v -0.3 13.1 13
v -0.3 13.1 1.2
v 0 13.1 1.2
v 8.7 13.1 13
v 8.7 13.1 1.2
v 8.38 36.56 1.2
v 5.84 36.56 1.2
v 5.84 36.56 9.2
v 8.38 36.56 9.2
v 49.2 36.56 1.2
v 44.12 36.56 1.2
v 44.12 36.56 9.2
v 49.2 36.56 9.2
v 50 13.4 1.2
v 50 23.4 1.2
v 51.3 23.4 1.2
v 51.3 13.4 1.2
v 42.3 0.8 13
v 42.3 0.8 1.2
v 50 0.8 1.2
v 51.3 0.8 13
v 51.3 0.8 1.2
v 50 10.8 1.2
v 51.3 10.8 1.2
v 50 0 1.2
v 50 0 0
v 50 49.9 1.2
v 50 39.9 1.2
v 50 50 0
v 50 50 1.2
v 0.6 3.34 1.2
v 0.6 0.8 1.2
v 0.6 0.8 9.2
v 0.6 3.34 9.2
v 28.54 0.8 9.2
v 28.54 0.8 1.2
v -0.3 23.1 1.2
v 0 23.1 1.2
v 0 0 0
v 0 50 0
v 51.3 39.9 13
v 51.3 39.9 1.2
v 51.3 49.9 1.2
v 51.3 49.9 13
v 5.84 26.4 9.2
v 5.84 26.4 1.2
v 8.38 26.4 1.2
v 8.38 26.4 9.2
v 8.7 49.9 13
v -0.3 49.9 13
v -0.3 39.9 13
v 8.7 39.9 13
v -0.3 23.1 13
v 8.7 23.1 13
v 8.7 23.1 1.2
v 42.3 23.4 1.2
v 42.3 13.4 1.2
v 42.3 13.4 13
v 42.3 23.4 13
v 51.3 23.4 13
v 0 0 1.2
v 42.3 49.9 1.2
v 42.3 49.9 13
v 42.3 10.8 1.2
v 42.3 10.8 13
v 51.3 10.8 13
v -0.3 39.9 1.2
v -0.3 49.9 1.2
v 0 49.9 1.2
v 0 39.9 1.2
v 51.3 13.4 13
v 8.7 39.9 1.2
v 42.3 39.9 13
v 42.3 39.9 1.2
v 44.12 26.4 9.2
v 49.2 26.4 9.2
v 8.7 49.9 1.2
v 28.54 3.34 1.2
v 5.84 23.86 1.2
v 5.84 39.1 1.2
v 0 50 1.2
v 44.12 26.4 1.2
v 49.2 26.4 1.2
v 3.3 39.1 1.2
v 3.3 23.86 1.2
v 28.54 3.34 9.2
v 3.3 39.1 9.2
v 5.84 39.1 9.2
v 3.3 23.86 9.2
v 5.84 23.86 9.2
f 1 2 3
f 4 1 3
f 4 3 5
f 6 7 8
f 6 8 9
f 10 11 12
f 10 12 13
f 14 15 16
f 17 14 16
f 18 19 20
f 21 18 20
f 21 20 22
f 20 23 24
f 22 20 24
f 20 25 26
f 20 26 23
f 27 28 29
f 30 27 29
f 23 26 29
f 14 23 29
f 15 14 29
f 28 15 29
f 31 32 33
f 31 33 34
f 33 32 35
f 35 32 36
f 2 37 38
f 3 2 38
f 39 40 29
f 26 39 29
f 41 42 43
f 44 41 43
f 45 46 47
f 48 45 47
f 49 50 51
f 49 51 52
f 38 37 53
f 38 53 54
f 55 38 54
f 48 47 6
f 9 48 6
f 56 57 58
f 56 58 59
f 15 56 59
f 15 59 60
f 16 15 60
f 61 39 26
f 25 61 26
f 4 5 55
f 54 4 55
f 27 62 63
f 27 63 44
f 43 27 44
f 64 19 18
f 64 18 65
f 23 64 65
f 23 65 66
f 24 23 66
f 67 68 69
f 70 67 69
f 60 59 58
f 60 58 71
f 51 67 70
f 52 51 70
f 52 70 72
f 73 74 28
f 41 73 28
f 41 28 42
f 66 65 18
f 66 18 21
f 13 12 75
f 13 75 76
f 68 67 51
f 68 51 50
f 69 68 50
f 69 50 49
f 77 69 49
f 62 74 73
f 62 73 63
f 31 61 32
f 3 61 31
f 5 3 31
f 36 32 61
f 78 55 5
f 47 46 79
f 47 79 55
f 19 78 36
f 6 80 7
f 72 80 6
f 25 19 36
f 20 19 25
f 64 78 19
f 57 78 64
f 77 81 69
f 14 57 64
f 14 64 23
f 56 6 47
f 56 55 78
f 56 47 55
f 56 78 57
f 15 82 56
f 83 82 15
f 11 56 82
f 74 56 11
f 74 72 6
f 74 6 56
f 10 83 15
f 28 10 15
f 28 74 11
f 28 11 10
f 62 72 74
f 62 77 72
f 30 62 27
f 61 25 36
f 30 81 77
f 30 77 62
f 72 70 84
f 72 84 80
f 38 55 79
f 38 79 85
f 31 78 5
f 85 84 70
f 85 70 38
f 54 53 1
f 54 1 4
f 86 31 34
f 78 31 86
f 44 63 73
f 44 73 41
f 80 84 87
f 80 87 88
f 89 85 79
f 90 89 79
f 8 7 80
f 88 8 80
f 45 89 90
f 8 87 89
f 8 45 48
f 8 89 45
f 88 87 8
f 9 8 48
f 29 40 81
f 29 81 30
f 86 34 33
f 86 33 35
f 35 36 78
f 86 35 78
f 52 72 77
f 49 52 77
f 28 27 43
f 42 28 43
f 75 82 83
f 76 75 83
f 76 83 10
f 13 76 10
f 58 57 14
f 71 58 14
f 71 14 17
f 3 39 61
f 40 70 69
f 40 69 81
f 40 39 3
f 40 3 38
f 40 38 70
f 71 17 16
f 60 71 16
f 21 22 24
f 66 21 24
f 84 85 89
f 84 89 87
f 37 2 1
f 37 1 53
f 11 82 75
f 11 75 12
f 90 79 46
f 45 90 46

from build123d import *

# Parameters (mm, degrees)
CROQUIS1_W              = 50
CROQUIS1_H              = 50
SALIENTE_EXTRUIR1_DEPTH = 1.2
CROQUIS2_W              = 9
CROQUIS2_H              = 10
SALIENTE_EXTRUIR2_DEPTH = 11.8
CROQUIS3_W              = 27.94
CROQUIS3_H              = 2.54
CROQUIS3_W_2            = 2.54
CROQUIS3_H_2            = 15.24
CROQUIS3_H_3            = 10.16
CROQUIS3_W_3            = 5.08
SALIENTE_EXTRUIR3_DEPTH = 8


with BuildPart() as part:
    # Croquis1 → Saliente-Extruir1 (new body)
    with BuildSketch(Plane.XY):
        with Locations((25, 25)):
            Rectangle(CROQUIS1_W, CROQUIS1_H)
    extrude(amount=SALIENTE_EXTRUIR1_DEPTH)

    # Croquis2 → Saliente-Extruir2 (add)
    with BuildSketch(Plane.XY.offset(1.2)):
        with Locations((46.8, 5.8)):
            Rectangle(CROQUIS2_W, CROQUIS2_H)
        with Locations((46.8, 18.4)):
            Rectangle(CROQUIS2_W, CROQUIS2_H)
        with Locations((46.8, 44.9)):
            Rectangle(CROQUIS2_W, CROQUIS2_H)
        with Locations((4.2, 44.9)):
            Rectangle(CROQUIS2_W, CROQUIS2_H)
        with Locations((4.2, 18.1)):
            Rectangle(CROQUIS2_W, CROQUIS2_H)
    extrude(amount=SALIENTE_EXTRUIR2_DEPTH)

    # Croquis3 → Saliente-Extruir3 (add)
    with BuildSketch(Plane.XY.offset(1.2)):
        with Locations((14.57, 2.07)):
            Rectangle(CROQUIS3_W, CROQUIS3_H)
        with Locations((4.57, 31.48)):
            Rectangle(CROQUIS3_W_2, CROQUIS3_H_2)
        with Locations((7.11, 31.48)):
            Rectangle(CROQUIS3_W_2, CROQUIS3_H_3)
        with Locations((46.66, 31.48)):
            Rectangle(CROQUIS3_W_3, CROQUIS3_H_3)
    extrude(amount=SALIENTE_EXTRUIR3_DEPTH)


solid = part.part
